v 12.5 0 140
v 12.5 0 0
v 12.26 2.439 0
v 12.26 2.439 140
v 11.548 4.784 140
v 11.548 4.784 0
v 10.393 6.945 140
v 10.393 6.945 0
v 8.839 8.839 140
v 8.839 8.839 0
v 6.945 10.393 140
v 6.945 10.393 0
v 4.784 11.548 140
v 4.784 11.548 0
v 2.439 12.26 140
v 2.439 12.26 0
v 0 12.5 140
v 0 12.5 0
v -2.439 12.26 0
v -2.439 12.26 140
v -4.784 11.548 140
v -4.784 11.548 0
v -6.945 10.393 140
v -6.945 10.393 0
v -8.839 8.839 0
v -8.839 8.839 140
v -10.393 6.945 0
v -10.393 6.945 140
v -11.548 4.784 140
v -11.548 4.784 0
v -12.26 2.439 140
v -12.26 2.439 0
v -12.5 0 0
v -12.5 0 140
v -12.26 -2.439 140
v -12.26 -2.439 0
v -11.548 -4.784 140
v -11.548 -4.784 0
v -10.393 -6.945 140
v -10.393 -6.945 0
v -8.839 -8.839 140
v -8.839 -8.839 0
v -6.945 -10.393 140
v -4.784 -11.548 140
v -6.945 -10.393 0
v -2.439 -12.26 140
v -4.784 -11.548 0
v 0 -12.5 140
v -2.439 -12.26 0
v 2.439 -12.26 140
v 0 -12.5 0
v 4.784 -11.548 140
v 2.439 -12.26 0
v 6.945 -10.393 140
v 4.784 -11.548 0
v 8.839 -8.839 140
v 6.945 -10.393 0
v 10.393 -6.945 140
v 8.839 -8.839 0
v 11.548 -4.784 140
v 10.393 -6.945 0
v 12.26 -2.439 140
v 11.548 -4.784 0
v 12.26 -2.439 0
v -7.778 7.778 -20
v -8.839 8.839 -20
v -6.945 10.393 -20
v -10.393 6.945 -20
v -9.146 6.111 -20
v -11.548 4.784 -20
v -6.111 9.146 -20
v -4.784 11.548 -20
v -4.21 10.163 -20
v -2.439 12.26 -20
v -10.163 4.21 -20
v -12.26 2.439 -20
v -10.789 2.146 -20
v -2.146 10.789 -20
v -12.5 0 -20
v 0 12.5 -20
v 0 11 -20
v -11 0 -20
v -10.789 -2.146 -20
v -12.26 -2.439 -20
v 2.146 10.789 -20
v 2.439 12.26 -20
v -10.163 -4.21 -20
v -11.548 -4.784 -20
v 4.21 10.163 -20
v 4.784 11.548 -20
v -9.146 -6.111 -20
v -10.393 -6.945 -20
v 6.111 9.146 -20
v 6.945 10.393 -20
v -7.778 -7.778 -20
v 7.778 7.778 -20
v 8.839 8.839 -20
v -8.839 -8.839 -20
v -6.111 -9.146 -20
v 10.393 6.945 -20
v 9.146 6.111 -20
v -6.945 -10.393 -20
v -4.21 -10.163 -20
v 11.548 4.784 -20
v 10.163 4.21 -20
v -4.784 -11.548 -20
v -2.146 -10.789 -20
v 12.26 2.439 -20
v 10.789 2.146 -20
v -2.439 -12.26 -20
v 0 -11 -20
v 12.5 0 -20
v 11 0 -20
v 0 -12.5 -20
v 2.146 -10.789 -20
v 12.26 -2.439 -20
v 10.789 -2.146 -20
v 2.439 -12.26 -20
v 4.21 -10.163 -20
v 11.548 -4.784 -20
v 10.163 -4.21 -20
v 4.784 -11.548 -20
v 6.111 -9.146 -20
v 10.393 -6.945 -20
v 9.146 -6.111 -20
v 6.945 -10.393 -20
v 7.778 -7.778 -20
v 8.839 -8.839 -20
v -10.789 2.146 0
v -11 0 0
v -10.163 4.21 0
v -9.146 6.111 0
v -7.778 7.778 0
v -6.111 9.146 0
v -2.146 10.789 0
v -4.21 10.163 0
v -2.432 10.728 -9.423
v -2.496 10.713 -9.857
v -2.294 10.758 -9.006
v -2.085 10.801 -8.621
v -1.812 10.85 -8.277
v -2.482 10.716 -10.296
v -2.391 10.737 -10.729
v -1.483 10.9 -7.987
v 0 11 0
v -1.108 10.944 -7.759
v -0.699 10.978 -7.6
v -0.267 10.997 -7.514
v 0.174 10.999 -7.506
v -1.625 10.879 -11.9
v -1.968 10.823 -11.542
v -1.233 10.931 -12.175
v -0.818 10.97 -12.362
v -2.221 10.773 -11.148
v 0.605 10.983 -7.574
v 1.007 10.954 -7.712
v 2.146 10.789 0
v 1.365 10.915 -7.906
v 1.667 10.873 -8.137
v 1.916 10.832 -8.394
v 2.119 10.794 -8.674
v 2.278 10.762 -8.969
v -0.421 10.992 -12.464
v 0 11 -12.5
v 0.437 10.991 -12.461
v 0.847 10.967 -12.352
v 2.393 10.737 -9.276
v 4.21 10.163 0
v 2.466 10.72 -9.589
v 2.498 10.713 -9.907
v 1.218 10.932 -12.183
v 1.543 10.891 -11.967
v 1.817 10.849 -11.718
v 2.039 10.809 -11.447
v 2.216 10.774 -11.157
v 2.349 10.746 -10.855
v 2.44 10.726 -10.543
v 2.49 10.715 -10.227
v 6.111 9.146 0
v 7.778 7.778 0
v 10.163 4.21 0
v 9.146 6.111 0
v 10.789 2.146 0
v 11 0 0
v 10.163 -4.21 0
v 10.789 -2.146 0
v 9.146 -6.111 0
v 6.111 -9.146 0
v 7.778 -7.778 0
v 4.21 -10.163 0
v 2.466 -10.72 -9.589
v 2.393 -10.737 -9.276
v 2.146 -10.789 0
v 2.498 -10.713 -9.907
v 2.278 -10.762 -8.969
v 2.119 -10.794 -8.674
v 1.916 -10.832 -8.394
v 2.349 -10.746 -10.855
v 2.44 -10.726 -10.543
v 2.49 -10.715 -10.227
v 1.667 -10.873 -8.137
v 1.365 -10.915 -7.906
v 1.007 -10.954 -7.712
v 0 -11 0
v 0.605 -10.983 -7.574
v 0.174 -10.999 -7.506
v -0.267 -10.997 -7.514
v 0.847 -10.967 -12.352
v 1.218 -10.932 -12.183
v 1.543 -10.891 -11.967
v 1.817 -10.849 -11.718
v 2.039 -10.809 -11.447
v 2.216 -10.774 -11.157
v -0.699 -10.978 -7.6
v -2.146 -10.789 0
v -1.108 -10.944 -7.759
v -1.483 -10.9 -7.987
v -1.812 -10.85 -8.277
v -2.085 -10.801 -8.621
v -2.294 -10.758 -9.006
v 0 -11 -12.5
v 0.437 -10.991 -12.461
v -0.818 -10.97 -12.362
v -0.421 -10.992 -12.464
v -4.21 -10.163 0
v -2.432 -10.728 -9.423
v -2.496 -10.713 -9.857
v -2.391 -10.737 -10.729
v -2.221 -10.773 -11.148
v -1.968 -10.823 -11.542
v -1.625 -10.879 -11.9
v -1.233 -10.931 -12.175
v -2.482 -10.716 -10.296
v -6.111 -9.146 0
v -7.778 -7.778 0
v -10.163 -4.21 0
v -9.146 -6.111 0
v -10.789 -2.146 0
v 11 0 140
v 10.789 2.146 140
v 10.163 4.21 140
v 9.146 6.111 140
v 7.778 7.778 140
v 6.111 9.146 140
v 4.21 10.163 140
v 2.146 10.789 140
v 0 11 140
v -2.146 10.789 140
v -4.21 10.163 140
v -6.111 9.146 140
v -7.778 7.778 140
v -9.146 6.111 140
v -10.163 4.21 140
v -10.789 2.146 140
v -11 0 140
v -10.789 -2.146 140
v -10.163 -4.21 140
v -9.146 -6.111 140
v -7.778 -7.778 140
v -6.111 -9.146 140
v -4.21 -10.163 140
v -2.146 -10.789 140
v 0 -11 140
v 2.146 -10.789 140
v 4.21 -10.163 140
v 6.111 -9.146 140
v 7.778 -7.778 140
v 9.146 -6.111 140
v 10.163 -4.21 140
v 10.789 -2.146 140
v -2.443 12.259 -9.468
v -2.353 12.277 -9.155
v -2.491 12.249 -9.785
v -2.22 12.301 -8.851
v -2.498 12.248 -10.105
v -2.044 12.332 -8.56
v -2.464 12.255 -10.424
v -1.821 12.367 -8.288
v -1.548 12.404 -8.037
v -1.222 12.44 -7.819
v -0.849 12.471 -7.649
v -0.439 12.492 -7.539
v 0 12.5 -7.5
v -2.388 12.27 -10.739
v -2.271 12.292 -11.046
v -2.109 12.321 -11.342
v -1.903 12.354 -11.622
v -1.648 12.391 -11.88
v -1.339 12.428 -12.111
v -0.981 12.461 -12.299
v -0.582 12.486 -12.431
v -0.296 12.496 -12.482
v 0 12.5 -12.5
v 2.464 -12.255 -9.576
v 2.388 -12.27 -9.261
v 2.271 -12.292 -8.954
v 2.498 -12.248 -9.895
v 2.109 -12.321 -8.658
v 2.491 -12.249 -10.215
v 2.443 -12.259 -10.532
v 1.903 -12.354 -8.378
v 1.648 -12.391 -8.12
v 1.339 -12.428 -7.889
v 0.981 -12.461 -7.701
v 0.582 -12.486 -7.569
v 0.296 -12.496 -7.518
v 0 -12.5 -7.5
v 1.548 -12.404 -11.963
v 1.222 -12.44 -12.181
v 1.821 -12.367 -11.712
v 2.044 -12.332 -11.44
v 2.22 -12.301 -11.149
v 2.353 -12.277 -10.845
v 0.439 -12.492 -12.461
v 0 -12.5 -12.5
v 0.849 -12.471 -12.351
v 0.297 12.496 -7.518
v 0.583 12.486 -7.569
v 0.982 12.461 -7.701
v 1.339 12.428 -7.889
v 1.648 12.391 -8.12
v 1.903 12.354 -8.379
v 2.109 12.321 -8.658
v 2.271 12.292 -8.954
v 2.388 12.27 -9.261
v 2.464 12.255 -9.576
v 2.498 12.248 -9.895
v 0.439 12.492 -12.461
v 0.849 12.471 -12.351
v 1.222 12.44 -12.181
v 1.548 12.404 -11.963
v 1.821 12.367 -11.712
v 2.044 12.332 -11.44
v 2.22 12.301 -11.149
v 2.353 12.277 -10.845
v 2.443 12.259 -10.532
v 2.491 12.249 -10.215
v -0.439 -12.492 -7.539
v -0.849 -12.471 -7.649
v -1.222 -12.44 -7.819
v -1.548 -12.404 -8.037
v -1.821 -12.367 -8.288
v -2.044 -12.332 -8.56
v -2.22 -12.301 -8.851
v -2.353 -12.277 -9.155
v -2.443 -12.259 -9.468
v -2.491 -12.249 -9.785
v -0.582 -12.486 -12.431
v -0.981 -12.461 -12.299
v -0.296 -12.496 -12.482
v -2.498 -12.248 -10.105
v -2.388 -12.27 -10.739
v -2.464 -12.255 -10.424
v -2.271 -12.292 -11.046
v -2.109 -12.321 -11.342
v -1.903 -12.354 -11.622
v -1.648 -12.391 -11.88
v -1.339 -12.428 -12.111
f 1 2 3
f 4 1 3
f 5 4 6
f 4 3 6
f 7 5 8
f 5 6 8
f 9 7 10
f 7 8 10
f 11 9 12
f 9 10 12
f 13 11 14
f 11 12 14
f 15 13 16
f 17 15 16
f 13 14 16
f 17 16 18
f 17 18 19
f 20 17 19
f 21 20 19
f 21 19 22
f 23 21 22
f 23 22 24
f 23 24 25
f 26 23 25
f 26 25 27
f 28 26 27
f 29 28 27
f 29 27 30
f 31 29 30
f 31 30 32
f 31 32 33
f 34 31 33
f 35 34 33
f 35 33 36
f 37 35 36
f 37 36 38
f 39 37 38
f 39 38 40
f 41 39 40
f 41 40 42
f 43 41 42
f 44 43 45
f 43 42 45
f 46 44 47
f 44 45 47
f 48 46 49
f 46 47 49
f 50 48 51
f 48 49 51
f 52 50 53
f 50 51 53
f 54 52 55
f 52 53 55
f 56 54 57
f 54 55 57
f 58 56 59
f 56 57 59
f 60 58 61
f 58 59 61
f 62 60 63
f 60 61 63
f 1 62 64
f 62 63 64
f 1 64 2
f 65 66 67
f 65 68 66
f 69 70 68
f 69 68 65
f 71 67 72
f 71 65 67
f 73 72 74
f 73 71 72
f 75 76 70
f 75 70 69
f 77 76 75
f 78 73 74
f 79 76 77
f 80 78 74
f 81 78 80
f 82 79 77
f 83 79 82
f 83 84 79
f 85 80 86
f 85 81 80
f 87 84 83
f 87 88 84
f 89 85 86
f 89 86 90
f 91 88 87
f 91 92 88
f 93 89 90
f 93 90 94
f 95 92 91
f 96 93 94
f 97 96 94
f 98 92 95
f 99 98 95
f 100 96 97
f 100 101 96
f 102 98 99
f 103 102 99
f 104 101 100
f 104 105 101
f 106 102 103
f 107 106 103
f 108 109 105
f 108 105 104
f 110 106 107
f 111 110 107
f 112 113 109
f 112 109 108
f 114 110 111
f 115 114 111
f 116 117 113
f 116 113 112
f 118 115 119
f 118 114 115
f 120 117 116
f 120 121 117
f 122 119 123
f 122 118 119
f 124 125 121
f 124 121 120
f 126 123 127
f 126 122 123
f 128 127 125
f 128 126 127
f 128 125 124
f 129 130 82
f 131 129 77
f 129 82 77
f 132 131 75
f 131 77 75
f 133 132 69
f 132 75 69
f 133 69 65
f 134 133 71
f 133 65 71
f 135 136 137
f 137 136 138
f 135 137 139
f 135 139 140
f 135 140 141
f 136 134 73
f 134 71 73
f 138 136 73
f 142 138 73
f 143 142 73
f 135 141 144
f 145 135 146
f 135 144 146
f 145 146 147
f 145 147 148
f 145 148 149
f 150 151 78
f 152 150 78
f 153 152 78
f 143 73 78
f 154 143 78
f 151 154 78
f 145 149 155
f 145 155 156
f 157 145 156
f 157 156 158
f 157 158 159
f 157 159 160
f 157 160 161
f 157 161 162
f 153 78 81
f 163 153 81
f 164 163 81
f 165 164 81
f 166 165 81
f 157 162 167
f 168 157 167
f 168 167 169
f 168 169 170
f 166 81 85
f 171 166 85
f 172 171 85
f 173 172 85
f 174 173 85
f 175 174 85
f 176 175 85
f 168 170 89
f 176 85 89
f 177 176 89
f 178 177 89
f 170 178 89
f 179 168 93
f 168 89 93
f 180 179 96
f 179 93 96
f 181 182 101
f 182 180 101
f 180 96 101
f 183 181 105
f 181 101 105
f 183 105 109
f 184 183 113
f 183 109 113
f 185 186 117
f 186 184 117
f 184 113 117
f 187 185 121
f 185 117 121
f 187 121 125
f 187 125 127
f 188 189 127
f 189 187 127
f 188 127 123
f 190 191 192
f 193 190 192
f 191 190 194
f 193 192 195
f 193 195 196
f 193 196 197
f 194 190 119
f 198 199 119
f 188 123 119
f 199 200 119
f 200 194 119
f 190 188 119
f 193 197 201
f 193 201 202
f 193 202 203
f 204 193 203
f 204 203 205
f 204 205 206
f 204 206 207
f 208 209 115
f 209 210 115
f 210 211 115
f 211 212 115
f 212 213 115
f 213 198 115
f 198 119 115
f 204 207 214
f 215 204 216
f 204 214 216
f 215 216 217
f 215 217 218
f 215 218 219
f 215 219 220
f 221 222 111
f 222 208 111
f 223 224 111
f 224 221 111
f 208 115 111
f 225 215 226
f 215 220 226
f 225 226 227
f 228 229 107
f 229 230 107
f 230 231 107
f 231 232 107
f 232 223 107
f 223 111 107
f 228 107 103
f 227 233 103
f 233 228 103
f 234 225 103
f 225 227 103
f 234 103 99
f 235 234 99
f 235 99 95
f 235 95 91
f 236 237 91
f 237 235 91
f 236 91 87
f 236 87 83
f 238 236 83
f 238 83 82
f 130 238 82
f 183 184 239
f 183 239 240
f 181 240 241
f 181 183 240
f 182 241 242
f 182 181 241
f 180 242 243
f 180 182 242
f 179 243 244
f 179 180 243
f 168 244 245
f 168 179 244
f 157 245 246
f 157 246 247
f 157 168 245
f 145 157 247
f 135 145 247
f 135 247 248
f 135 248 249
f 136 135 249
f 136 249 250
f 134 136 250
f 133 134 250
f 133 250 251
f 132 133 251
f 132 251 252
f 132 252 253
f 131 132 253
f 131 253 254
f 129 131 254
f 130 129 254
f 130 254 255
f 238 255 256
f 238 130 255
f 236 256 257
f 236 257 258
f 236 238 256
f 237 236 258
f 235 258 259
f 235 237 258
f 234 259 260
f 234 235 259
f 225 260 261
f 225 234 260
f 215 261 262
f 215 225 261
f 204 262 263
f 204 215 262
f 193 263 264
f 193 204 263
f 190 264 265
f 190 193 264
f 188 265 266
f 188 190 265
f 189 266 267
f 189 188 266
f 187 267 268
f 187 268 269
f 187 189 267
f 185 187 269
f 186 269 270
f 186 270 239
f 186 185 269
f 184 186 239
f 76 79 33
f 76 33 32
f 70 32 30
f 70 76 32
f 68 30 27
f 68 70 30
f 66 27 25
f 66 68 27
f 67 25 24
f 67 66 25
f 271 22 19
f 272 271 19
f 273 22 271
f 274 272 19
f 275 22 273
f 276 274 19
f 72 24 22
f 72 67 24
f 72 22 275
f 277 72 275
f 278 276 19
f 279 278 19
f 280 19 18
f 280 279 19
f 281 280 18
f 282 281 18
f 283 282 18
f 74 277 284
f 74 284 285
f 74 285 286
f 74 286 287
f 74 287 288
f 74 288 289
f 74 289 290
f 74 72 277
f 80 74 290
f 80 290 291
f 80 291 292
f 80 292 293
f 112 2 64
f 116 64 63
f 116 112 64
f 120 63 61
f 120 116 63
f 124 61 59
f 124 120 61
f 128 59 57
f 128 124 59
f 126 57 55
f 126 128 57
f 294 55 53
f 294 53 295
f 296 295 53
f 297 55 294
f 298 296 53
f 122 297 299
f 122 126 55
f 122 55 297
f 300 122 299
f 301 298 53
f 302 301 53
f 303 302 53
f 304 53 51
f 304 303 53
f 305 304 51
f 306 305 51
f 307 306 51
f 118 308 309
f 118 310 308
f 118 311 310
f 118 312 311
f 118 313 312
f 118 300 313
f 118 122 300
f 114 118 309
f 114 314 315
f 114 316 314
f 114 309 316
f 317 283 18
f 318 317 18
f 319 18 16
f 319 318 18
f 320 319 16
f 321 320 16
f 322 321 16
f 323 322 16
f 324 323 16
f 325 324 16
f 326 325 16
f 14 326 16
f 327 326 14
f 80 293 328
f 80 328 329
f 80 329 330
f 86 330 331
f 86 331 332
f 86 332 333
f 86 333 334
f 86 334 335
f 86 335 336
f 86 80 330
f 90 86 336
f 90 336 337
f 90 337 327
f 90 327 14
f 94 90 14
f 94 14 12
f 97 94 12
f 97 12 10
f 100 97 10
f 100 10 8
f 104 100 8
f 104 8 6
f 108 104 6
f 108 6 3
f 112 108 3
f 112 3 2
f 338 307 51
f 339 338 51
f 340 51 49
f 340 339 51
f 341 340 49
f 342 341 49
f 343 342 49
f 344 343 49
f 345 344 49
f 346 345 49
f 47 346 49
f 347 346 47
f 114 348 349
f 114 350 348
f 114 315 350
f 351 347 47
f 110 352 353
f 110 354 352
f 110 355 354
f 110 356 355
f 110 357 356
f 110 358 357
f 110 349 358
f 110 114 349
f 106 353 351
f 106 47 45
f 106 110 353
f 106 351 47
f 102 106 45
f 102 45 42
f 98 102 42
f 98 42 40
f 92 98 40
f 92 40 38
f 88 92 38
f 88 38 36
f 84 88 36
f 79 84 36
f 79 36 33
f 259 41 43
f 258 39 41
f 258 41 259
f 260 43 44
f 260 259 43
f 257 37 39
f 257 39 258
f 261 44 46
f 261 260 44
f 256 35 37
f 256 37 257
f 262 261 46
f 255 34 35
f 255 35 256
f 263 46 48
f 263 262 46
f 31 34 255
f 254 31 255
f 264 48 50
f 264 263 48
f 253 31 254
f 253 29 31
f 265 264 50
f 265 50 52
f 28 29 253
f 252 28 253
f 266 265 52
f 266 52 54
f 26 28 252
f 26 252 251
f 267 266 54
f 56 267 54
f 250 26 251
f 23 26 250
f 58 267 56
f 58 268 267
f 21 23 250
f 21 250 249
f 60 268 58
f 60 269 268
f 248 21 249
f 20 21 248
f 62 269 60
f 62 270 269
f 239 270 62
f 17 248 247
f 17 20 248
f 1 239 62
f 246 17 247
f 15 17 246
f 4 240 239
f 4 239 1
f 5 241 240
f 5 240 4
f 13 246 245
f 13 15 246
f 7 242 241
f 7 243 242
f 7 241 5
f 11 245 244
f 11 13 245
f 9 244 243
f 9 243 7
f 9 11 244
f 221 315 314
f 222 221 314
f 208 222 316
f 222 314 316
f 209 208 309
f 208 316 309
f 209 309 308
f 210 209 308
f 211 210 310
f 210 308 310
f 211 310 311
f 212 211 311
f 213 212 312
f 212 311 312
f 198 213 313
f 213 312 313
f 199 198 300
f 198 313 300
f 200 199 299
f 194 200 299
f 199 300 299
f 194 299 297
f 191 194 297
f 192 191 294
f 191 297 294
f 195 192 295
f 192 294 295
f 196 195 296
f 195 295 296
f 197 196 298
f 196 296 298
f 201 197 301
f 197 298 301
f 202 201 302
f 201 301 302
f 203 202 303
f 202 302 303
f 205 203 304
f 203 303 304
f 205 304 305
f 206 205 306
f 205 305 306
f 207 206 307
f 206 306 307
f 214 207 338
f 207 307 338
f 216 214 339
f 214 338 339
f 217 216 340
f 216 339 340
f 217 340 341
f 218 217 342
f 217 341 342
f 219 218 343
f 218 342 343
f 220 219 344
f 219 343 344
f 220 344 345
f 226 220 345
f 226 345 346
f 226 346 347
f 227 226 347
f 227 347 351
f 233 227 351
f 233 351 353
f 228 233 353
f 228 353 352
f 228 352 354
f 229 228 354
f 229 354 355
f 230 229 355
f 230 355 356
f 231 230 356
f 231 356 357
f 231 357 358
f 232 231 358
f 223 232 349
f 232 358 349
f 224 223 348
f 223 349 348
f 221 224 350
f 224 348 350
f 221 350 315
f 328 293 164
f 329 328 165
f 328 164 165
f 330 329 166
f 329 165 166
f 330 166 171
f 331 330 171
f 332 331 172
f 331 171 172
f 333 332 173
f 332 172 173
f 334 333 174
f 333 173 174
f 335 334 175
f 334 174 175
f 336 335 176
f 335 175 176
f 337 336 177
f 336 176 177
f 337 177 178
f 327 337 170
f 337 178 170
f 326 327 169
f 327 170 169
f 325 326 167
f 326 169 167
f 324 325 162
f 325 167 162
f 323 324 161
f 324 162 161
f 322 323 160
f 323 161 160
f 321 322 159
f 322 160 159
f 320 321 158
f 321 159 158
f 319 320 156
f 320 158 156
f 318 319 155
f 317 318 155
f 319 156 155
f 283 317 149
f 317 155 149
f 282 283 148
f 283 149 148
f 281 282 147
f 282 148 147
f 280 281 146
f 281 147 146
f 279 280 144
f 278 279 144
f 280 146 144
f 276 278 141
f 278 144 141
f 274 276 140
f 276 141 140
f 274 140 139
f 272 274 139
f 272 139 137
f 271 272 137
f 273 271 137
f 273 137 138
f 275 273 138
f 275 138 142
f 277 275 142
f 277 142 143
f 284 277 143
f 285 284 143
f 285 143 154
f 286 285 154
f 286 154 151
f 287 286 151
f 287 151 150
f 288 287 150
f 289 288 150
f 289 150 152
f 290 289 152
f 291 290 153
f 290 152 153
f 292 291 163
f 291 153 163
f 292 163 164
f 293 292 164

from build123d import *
from build123d.topology import SkipClean

# Parameters (mm, degrees)
ESBO_O1_R                = 12.5
ESBO_O1_R_2              = 11
RESSALTO_EXTRUS_O1_DEPTH = 140
RESSALTO_EXTRUS_O2_START = 20
ESBO_O2_R                = 12.5
ESBO_O2_R_2              = 11
RESSALTO_EXTRUS_O2_DEPTH = 20
ESBO_O3_R                = 2.5
CORTE_EXTRUS_O1_DEPTH    = 40
FILETE1_START            = -20
FILETE1_DEPTH            = 20


with BuildPart() as part:
    # Esboço1 → Ressalto-extrusão1 (new body)
    with BuildSketch(Plane.XY):
        Circle(ESBO_O1_R)
        Circle(ESBO_O1_R_2, mode=Mode.SUBTRACT)
    extrude(amount=RESSALTO_EXTRUS_O1_DEPTH)

    # Esboço2 → Ressalto-extrusão2 (add)
    # profile 1 of 5: a face of its own
    with SkipClean():  # the faces are left unmerged after this step: merging them gives an invalid solid
        with BuildSketch(Plane(origin=(0, 0, 0), x_dir=(-1, 0, 0), z_dir=(0, 0, -1)).offset(RESSALTO_EXTRUS_O2_START)):
            with BuildLine():
                Line((12.5, 12.5), (0, 12.5))
                ThreePointArc((0, 12.5), (8.838834765, 8.838834765), (12.5, 0))
                Line((12.5, 0), (12.5, 12.5))
            make_face()
        # profile 2 of 5: a face of its own
        with BuildSketch(Plane(origin=(0, 0, 0), x_dir=(-1, 0, 0), z_dir=(0, 0, -1)).offset(RESSALTO_EXTRUS_O2_START)):
            with BuildLine():
                Line((12.5, -12.5), (12.5, 0))
                ThreePointArc((12.5, 0), (8.838834747, -8.838834783), (-5.1e-08, -12.5))
                Line((-5.1e-08, -12.5), (12.5, -12.5))
            make_face()
        # profile 3 of 5: a face of its own
        with BuildSketch(Plane(origin=(0, 0, 0), x_dir=(-1, 0, 0), z_dir=(0, 0, -1)).offset(RESSALTO_EXTRUS_O2_START)):
            with BuildLine():
                ThreePointArc((-5.1e-08, -12.5), (-8.838834783, -8.838834747), (-12.5, 0))
                Line((-12.5, 0), (-12.5, -12.5))
                Line((-12.5, -12.5), (-5.1e-08, -12.5))
            make_face()
        # profile 4 of 5: a face of its own
        with BuildSketch(Plane(origin=(0, 0, 0), x_dir=(-1, 0, 0), z_dir=(0, 0, -1)).offset(RESSALTO_EXTRUS_O2_START)):
            with BuildLine():
                ThreePointArc((-12.5, 0), (-8.838834765, 8.838834765), (0, 12.5))
                Line((0, 12.5), (-12.5, 12.5))
                Line((-12.5, 12.5), (-12.5, 0))
            make_face()
        # profile 5 of 5: a face of its own
        with BuildSketch(Plane(origin=(0, 0, 0), x_dir=(-1, 0, 0), z_dir=(0, 0, -1)).offset(RESSALTO_EXTRUS_O2_START)):
            with Locations(Location((0, 0, 0), (0, 0, 180))):
                Circle(ESBO_O2_R)
            Circle(ESBO_O2_R_2, mode=Mode.SUBTRACT)
        extrude(amount=-RESSALTO_EXTRUS_O2_DEPTH)

    # Esboço3 → Corte-extrusão1 (cut)
    with SkipClean():  # the faces are left unmerged after this step: merging them gives an invalid solid
        with BuildSketch(Plane(origin=(0, -12.5, 0), x_dir=(-1, 0, 0), z_dir=(0, -1, 0))):
            with Locations(Location((0, 10, 0), (0, 0, 90))):
                Circle(ESBO_O3_R)
        extrude(amount=-CORTE_EXTRUS_O1_DEPTH, mode=Mode.SUBTRACT)

    # Filete1: read off the stored shape, not the designer's step
    # Filete1 outline → Filete1 (cut)
    with SkipClean():  # the faces are left unmerged after this step: merging them gives an invalid solid
        with BuildSketch(Plane.XY.offset(FILETE1_START)):
            with BuildLine():
                Line((12.5, 12.5), (0, 12.5))
                ThreePointArc((0, 12.5), (8.838834765, 8.838834765), (12.5, 0))
                Line((12.5, 0), (12.5, 12.5))
            make_face()
            with BuildLine():
                ThreePointArc((-12.5, 0), (-8.838834765, 8.838834765), (0, 12.5))
                Line((0, 12.5), (-12.5, 12.5))
                Line((-12.5, 12.5), (-12.5, 0))
            make_face()
            with BuildLine():
                ThreePointArc((0, -12.5), (-8.838834765, -8.838834765), (-12.5, 0))
                Line((-12.5, 0), (-12.5, -12.5))
                Line((-12.5, -12.5), (0, -12.5))
            make_face()
            with BuildLine():
                Line((12.5, -12.5), (12.5, 0))
                ThreePointArc((12.5, 0), (8.838834765, -8.838834765), (0, -12.5))
                Line((0, -12.5), (12.5, -12.5))
            make_face()
        extrude(amount=FILETE1_DEPTH, mode=Mode.SUBTRACT)


solid = part.part
